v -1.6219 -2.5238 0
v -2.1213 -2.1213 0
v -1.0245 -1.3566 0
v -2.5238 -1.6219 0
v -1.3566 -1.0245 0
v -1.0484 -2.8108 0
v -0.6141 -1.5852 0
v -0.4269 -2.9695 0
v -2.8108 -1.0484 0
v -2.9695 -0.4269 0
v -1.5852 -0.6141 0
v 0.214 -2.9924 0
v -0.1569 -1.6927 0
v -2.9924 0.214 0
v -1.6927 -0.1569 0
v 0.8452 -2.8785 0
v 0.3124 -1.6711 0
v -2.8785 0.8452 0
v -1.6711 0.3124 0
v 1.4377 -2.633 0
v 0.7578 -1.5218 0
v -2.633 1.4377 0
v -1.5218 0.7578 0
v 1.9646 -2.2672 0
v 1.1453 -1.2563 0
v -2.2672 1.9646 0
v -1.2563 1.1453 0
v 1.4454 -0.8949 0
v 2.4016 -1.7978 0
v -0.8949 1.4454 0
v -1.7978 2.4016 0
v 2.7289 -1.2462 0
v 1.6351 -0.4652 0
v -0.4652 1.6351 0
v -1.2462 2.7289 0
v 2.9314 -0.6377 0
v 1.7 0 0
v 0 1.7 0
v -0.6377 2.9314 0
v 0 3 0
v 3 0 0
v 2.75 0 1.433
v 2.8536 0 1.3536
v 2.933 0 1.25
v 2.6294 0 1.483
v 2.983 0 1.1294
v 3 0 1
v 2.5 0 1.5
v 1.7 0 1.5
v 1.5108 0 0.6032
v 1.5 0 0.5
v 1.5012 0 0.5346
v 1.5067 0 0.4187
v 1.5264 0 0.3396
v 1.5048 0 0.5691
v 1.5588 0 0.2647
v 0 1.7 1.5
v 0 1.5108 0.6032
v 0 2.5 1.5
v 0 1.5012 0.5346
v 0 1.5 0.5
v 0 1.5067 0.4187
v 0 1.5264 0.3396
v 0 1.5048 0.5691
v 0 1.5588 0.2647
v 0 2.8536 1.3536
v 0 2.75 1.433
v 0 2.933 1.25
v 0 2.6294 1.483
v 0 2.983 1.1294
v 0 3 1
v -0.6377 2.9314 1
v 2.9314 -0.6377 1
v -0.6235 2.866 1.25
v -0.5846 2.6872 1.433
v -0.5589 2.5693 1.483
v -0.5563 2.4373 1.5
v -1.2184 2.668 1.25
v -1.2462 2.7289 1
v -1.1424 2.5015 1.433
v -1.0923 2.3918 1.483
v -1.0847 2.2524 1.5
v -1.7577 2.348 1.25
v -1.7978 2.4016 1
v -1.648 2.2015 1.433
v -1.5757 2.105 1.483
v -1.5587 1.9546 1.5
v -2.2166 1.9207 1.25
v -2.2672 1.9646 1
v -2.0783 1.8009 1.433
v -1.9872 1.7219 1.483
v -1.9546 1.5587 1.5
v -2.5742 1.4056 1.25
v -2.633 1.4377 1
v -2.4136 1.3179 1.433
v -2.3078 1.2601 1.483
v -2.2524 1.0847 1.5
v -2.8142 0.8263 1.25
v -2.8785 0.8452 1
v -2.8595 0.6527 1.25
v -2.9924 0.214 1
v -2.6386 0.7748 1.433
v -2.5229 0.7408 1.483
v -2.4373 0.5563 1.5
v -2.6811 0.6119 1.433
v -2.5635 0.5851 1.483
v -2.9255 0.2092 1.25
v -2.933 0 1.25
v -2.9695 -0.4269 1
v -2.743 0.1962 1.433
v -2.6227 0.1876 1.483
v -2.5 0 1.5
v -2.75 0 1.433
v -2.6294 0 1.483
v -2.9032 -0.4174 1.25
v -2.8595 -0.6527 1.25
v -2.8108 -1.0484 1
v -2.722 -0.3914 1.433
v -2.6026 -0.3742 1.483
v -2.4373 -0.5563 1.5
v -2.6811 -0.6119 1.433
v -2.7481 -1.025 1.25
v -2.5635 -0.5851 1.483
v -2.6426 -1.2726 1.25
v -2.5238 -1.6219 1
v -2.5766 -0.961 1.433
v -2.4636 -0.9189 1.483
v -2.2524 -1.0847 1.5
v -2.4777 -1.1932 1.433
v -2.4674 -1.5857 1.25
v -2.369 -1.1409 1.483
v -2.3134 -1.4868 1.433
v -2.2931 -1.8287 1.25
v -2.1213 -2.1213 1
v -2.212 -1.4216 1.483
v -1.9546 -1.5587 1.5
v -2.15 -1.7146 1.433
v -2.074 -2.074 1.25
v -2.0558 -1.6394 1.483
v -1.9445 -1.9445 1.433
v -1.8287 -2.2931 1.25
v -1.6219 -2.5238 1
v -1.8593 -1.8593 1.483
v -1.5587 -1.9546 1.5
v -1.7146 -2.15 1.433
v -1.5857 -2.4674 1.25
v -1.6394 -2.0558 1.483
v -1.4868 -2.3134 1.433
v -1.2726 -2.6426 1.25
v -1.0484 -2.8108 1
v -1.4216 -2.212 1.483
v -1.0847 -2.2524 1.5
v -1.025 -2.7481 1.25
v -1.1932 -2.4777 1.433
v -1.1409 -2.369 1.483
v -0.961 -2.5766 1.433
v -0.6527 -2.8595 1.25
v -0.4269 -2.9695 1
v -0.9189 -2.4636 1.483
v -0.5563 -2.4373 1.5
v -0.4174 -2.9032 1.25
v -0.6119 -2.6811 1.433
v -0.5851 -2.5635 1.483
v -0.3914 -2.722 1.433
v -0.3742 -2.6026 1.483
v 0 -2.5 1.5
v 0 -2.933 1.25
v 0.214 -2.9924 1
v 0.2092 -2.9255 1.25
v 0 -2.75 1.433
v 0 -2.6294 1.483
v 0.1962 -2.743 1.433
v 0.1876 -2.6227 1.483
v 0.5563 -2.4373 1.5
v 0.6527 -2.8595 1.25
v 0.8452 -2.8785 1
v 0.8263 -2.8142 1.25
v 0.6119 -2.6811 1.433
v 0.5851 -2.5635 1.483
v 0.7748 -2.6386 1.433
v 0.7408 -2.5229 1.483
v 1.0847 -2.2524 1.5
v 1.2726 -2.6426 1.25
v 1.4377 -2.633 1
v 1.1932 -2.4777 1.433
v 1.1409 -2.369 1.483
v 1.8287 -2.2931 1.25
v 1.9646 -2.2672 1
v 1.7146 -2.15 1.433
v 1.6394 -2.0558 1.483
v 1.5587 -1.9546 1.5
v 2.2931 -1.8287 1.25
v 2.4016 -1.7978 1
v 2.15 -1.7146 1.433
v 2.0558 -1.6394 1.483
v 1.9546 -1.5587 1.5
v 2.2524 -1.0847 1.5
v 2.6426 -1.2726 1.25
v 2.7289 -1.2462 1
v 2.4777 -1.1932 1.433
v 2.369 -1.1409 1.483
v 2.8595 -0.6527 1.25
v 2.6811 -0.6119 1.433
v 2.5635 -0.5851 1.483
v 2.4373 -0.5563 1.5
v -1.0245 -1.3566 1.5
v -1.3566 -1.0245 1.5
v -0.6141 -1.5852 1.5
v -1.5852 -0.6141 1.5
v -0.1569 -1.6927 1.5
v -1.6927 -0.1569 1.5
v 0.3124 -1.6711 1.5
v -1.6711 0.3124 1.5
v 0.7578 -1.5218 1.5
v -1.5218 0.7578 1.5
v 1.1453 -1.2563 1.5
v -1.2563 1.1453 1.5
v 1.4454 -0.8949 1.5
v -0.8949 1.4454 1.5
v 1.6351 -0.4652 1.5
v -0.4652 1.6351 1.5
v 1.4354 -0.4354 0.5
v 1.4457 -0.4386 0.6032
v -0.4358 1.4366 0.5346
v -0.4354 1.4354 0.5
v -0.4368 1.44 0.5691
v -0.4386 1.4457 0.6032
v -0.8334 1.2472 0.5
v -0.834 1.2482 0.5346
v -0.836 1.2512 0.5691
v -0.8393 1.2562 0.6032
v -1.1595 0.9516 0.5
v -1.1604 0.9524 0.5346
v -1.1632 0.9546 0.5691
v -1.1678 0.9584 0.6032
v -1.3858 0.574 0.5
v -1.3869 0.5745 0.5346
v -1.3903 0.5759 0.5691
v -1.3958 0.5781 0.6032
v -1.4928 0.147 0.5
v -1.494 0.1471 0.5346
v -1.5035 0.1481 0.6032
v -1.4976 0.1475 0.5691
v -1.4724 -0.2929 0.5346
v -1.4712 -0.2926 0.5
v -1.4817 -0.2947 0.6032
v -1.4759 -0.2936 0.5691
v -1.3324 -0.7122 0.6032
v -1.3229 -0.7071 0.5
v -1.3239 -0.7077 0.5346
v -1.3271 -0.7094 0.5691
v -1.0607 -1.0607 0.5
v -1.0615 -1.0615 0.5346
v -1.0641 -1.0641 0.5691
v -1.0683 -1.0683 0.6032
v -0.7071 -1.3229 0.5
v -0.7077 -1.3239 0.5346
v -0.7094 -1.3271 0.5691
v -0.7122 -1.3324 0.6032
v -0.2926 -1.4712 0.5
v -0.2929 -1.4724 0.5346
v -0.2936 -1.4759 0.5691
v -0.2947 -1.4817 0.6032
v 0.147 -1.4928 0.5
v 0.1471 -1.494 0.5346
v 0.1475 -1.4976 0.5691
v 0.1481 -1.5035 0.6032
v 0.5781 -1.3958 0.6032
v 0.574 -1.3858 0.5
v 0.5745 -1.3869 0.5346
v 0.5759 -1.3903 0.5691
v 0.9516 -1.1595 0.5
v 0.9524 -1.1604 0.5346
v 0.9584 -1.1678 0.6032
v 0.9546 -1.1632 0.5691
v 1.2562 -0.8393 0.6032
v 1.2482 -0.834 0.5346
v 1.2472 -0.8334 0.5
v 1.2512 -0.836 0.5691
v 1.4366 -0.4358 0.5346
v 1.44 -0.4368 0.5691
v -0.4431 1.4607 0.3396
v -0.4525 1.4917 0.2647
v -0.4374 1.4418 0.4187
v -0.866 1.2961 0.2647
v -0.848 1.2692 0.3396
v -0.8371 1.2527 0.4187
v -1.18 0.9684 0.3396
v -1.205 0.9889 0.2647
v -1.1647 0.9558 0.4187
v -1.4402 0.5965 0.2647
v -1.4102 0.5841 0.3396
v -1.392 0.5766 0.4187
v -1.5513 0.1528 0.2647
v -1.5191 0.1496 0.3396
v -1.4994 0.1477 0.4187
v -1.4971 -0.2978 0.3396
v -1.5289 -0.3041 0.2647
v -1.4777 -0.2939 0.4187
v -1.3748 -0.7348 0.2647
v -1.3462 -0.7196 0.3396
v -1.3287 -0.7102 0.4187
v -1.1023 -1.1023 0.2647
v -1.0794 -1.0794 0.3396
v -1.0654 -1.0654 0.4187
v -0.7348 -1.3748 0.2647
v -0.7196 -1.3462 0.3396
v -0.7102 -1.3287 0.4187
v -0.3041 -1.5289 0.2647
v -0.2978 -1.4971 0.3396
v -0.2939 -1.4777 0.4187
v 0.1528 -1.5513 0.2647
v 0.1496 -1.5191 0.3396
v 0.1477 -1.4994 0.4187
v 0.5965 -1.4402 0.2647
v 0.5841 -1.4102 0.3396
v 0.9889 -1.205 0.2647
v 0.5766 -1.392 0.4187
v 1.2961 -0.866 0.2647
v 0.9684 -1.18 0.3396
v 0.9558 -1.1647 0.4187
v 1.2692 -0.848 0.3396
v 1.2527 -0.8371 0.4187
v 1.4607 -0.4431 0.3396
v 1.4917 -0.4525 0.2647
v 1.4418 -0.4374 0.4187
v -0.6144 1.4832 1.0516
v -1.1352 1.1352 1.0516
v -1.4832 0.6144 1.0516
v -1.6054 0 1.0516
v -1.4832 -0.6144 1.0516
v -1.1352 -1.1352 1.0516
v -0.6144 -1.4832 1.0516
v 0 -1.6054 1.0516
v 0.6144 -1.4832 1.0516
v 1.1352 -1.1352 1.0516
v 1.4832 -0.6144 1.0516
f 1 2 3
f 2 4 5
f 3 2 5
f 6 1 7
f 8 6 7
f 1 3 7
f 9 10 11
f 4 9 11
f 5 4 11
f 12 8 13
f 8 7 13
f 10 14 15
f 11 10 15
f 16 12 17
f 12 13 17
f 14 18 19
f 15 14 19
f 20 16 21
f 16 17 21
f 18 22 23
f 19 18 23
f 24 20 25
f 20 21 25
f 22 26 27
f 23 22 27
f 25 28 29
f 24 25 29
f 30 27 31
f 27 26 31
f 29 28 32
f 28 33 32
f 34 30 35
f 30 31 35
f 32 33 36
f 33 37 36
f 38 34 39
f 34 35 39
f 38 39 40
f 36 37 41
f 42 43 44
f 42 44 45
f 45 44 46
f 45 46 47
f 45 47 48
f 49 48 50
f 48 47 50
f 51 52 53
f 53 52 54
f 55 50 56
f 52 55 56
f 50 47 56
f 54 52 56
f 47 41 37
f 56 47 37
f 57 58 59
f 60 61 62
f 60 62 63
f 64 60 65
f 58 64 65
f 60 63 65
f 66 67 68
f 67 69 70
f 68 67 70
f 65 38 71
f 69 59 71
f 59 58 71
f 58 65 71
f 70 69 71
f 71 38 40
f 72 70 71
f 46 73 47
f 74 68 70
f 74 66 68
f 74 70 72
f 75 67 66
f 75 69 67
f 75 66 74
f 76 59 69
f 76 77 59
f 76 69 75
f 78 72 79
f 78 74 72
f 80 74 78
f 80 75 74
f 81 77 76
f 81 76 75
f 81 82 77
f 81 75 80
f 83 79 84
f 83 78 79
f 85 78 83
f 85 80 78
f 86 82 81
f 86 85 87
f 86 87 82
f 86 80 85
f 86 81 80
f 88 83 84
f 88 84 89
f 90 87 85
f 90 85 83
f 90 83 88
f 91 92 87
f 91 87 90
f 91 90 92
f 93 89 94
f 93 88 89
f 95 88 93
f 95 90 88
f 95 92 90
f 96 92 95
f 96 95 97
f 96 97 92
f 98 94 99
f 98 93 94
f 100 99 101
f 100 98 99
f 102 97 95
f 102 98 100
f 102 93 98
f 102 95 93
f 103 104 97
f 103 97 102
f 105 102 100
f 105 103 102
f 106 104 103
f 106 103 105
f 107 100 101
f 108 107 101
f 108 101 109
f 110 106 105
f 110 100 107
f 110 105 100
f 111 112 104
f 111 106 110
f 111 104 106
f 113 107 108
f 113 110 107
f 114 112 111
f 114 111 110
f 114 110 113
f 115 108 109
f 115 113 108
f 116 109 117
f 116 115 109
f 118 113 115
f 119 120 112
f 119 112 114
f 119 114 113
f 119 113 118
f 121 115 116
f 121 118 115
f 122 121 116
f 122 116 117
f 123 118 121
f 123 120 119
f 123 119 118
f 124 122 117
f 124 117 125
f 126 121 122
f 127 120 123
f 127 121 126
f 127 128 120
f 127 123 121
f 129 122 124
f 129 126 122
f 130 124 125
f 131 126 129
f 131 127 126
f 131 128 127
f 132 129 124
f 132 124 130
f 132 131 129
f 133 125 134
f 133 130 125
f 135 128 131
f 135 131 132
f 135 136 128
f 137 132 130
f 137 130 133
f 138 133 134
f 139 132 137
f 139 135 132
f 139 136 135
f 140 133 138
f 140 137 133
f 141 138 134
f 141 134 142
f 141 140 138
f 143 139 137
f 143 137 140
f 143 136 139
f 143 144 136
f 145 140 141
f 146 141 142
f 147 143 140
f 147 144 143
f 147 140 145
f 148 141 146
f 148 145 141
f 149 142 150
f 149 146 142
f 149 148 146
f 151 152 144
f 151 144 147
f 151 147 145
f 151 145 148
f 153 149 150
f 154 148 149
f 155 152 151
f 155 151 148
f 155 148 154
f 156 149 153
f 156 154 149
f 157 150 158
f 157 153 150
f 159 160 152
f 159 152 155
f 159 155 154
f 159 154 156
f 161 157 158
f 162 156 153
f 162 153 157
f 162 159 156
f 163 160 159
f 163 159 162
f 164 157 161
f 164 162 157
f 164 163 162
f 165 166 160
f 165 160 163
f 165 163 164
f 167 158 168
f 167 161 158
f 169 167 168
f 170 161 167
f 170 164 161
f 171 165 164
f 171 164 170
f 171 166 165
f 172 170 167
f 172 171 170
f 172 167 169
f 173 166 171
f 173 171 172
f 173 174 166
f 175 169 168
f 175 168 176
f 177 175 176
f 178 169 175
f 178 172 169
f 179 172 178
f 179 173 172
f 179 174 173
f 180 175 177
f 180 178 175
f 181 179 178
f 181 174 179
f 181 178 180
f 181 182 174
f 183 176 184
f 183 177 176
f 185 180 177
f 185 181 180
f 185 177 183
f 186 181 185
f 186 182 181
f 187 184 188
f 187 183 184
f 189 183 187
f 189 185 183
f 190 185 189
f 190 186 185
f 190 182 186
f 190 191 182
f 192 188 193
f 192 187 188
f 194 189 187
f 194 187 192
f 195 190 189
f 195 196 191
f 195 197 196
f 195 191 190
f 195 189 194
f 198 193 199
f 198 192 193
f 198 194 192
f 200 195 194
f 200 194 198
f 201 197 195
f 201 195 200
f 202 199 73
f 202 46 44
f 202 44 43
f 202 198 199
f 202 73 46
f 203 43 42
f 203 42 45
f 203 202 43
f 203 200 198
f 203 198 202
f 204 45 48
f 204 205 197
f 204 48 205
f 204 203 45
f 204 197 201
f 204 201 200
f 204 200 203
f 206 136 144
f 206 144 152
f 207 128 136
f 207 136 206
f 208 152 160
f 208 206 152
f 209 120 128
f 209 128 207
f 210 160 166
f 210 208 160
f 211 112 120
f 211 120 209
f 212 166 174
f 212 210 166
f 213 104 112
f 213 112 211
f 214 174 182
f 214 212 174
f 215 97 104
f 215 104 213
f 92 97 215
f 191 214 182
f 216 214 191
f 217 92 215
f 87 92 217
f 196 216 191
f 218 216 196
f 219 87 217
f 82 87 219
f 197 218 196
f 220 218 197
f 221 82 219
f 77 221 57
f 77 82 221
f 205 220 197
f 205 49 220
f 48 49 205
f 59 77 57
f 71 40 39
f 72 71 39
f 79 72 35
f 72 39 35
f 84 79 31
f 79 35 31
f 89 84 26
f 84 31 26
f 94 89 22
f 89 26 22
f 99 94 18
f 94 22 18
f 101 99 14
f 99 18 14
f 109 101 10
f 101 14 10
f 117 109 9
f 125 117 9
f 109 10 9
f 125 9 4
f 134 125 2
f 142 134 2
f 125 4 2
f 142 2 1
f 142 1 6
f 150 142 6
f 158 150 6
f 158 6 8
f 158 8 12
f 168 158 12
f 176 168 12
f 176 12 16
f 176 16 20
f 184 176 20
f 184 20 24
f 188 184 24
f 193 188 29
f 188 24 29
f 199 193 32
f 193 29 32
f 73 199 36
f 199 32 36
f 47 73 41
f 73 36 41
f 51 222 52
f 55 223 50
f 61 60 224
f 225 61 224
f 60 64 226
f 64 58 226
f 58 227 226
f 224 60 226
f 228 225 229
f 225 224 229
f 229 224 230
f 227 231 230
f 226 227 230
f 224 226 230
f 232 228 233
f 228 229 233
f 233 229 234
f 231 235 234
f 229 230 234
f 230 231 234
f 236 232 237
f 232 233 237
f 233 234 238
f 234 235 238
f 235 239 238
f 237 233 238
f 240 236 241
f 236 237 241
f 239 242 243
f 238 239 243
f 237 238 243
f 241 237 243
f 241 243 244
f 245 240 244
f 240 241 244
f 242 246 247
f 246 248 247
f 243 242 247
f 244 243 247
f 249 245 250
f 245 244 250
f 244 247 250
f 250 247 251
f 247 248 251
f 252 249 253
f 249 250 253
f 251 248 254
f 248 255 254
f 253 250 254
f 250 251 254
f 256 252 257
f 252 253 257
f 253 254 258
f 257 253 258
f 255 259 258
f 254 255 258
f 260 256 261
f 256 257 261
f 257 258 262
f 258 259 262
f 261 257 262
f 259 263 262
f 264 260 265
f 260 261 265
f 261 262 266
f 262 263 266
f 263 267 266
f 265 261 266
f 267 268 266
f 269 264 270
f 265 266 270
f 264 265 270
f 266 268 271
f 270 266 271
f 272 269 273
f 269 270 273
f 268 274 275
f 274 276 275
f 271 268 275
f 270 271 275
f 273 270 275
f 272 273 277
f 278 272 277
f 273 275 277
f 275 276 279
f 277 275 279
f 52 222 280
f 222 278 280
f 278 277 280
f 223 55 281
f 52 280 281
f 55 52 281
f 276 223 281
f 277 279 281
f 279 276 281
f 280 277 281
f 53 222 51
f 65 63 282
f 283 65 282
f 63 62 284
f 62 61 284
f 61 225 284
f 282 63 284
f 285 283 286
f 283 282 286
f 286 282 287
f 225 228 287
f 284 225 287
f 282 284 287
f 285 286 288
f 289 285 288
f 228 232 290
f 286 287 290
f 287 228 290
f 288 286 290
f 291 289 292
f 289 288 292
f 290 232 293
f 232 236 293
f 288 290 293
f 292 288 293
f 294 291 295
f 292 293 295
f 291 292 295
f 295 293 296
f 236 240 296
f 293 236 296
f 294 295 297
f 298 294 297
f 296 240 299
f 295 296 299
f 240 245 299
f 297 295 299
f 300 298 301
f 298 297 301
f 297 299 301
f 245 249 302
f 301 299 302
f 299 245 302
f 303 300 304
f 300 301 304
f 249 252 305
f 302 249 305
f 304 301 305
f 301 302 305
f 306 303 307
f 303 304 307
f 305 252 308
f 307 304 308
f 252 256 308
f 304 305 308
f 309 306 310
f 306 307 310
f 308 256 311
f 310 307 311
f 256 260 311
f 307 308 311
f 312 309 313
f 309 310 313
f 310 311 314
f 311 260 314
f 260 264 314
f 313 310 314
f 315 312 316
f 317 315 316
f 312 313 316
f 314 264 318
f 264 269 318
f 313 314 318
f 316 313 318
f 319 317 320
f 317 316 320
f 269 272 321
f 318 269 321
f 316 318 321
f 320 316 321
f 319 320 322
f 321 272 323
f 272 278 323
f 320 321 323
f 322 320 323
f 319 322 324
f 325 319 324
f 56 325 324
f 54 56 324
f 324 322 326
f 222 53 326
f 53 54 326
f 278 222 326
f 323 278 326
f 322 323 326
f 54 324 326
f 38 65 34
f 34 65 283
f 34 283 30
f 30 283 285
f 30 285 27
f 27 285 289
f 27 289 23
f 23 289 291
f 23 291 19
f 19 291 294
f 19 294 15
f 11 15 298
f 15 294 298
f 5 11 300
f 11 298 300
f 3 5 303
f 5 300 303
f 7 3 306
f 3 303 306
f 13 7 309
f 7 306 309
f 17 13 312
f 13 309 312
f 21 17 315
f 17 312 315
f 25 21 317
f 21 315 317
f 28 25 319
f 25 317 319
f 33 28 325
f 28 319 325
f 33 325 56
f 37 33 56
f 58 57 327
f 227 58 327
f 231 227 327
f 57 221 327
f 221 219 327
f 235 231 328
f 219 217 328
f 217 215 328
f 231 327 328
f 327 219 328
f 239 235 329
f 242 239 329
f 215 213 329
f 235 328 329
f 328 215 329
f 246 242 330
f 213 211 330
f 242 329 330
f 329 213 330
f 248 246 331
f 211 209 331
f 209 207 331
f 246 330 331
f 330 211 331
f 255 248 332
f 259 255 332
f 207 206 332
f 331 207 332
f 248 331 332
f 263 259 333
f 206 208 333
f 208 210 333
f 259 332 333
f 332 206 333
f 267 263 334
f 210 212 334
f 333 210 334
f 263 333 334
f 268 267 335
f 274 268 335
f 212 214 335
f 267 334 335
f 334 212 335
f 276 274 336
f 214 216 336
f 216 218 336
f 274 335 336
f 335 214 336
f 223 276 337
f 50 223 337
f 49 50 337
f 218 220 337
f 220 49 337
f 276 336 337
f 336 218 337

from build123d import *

# Parameters (mm, degrees)
F1_DEPTH = 1.5
F4_R     = 0.5


with BuildPart() as f1:
    # F0 (on Top) → F1 (new body)
    with BuildSketch(Plane.XY):
        with BuildLine():
            Line((0, 1.5), (0, 3))
            ThreePointArc((0, 3), (-2.12132, -2.12132), (3, 0))
            Line((3, 0), (1.5, 0))
            ThreePointArc((1.5, 0), (-1.06066, -1.06066), (0, 1.5))
        make_face()
    extrude(amount=F1_DEPTH)

    # F2 (on face) → F3 (revolve, cut)
    with BuildSketch(Plane.YZ):
        with BuildLine():
            ThreePointArc((1.558824, 0.264706), (1.514929, 0.378732), (1.5, 0.5))
            Line((1.5, 0.5), (1.5, 0))
            Line((1.5, 0), (1.7, 0))
            Line((1.7, 0), (1.558824, 0.264706))
        make_face()
        with BuildLine():
            Line((1.7, 1.5), (1.5, 1.5))
            Line((1.5, 1.5), (1.5, 0.5))
            ThreePointArc((1.5, 0.5), (1.502701, 0.551896), (1.510773, 0.603232))
            Line((1.510773, 0.603232), (1.7, 1.5))
        make_face()
    revolve(axis=Axis((0, 0, 0.75), (0, 0, 1)), mode=Mode.SUBTRACT)

    # F4
    f4_edges = [f1.edges().sort_by_distance(p)[0] for p in [
        (-2.12132, -2.12132, 1.5),
    ]]
    fillet(f4_edges, radius=F4_R)


solid = f1.part
